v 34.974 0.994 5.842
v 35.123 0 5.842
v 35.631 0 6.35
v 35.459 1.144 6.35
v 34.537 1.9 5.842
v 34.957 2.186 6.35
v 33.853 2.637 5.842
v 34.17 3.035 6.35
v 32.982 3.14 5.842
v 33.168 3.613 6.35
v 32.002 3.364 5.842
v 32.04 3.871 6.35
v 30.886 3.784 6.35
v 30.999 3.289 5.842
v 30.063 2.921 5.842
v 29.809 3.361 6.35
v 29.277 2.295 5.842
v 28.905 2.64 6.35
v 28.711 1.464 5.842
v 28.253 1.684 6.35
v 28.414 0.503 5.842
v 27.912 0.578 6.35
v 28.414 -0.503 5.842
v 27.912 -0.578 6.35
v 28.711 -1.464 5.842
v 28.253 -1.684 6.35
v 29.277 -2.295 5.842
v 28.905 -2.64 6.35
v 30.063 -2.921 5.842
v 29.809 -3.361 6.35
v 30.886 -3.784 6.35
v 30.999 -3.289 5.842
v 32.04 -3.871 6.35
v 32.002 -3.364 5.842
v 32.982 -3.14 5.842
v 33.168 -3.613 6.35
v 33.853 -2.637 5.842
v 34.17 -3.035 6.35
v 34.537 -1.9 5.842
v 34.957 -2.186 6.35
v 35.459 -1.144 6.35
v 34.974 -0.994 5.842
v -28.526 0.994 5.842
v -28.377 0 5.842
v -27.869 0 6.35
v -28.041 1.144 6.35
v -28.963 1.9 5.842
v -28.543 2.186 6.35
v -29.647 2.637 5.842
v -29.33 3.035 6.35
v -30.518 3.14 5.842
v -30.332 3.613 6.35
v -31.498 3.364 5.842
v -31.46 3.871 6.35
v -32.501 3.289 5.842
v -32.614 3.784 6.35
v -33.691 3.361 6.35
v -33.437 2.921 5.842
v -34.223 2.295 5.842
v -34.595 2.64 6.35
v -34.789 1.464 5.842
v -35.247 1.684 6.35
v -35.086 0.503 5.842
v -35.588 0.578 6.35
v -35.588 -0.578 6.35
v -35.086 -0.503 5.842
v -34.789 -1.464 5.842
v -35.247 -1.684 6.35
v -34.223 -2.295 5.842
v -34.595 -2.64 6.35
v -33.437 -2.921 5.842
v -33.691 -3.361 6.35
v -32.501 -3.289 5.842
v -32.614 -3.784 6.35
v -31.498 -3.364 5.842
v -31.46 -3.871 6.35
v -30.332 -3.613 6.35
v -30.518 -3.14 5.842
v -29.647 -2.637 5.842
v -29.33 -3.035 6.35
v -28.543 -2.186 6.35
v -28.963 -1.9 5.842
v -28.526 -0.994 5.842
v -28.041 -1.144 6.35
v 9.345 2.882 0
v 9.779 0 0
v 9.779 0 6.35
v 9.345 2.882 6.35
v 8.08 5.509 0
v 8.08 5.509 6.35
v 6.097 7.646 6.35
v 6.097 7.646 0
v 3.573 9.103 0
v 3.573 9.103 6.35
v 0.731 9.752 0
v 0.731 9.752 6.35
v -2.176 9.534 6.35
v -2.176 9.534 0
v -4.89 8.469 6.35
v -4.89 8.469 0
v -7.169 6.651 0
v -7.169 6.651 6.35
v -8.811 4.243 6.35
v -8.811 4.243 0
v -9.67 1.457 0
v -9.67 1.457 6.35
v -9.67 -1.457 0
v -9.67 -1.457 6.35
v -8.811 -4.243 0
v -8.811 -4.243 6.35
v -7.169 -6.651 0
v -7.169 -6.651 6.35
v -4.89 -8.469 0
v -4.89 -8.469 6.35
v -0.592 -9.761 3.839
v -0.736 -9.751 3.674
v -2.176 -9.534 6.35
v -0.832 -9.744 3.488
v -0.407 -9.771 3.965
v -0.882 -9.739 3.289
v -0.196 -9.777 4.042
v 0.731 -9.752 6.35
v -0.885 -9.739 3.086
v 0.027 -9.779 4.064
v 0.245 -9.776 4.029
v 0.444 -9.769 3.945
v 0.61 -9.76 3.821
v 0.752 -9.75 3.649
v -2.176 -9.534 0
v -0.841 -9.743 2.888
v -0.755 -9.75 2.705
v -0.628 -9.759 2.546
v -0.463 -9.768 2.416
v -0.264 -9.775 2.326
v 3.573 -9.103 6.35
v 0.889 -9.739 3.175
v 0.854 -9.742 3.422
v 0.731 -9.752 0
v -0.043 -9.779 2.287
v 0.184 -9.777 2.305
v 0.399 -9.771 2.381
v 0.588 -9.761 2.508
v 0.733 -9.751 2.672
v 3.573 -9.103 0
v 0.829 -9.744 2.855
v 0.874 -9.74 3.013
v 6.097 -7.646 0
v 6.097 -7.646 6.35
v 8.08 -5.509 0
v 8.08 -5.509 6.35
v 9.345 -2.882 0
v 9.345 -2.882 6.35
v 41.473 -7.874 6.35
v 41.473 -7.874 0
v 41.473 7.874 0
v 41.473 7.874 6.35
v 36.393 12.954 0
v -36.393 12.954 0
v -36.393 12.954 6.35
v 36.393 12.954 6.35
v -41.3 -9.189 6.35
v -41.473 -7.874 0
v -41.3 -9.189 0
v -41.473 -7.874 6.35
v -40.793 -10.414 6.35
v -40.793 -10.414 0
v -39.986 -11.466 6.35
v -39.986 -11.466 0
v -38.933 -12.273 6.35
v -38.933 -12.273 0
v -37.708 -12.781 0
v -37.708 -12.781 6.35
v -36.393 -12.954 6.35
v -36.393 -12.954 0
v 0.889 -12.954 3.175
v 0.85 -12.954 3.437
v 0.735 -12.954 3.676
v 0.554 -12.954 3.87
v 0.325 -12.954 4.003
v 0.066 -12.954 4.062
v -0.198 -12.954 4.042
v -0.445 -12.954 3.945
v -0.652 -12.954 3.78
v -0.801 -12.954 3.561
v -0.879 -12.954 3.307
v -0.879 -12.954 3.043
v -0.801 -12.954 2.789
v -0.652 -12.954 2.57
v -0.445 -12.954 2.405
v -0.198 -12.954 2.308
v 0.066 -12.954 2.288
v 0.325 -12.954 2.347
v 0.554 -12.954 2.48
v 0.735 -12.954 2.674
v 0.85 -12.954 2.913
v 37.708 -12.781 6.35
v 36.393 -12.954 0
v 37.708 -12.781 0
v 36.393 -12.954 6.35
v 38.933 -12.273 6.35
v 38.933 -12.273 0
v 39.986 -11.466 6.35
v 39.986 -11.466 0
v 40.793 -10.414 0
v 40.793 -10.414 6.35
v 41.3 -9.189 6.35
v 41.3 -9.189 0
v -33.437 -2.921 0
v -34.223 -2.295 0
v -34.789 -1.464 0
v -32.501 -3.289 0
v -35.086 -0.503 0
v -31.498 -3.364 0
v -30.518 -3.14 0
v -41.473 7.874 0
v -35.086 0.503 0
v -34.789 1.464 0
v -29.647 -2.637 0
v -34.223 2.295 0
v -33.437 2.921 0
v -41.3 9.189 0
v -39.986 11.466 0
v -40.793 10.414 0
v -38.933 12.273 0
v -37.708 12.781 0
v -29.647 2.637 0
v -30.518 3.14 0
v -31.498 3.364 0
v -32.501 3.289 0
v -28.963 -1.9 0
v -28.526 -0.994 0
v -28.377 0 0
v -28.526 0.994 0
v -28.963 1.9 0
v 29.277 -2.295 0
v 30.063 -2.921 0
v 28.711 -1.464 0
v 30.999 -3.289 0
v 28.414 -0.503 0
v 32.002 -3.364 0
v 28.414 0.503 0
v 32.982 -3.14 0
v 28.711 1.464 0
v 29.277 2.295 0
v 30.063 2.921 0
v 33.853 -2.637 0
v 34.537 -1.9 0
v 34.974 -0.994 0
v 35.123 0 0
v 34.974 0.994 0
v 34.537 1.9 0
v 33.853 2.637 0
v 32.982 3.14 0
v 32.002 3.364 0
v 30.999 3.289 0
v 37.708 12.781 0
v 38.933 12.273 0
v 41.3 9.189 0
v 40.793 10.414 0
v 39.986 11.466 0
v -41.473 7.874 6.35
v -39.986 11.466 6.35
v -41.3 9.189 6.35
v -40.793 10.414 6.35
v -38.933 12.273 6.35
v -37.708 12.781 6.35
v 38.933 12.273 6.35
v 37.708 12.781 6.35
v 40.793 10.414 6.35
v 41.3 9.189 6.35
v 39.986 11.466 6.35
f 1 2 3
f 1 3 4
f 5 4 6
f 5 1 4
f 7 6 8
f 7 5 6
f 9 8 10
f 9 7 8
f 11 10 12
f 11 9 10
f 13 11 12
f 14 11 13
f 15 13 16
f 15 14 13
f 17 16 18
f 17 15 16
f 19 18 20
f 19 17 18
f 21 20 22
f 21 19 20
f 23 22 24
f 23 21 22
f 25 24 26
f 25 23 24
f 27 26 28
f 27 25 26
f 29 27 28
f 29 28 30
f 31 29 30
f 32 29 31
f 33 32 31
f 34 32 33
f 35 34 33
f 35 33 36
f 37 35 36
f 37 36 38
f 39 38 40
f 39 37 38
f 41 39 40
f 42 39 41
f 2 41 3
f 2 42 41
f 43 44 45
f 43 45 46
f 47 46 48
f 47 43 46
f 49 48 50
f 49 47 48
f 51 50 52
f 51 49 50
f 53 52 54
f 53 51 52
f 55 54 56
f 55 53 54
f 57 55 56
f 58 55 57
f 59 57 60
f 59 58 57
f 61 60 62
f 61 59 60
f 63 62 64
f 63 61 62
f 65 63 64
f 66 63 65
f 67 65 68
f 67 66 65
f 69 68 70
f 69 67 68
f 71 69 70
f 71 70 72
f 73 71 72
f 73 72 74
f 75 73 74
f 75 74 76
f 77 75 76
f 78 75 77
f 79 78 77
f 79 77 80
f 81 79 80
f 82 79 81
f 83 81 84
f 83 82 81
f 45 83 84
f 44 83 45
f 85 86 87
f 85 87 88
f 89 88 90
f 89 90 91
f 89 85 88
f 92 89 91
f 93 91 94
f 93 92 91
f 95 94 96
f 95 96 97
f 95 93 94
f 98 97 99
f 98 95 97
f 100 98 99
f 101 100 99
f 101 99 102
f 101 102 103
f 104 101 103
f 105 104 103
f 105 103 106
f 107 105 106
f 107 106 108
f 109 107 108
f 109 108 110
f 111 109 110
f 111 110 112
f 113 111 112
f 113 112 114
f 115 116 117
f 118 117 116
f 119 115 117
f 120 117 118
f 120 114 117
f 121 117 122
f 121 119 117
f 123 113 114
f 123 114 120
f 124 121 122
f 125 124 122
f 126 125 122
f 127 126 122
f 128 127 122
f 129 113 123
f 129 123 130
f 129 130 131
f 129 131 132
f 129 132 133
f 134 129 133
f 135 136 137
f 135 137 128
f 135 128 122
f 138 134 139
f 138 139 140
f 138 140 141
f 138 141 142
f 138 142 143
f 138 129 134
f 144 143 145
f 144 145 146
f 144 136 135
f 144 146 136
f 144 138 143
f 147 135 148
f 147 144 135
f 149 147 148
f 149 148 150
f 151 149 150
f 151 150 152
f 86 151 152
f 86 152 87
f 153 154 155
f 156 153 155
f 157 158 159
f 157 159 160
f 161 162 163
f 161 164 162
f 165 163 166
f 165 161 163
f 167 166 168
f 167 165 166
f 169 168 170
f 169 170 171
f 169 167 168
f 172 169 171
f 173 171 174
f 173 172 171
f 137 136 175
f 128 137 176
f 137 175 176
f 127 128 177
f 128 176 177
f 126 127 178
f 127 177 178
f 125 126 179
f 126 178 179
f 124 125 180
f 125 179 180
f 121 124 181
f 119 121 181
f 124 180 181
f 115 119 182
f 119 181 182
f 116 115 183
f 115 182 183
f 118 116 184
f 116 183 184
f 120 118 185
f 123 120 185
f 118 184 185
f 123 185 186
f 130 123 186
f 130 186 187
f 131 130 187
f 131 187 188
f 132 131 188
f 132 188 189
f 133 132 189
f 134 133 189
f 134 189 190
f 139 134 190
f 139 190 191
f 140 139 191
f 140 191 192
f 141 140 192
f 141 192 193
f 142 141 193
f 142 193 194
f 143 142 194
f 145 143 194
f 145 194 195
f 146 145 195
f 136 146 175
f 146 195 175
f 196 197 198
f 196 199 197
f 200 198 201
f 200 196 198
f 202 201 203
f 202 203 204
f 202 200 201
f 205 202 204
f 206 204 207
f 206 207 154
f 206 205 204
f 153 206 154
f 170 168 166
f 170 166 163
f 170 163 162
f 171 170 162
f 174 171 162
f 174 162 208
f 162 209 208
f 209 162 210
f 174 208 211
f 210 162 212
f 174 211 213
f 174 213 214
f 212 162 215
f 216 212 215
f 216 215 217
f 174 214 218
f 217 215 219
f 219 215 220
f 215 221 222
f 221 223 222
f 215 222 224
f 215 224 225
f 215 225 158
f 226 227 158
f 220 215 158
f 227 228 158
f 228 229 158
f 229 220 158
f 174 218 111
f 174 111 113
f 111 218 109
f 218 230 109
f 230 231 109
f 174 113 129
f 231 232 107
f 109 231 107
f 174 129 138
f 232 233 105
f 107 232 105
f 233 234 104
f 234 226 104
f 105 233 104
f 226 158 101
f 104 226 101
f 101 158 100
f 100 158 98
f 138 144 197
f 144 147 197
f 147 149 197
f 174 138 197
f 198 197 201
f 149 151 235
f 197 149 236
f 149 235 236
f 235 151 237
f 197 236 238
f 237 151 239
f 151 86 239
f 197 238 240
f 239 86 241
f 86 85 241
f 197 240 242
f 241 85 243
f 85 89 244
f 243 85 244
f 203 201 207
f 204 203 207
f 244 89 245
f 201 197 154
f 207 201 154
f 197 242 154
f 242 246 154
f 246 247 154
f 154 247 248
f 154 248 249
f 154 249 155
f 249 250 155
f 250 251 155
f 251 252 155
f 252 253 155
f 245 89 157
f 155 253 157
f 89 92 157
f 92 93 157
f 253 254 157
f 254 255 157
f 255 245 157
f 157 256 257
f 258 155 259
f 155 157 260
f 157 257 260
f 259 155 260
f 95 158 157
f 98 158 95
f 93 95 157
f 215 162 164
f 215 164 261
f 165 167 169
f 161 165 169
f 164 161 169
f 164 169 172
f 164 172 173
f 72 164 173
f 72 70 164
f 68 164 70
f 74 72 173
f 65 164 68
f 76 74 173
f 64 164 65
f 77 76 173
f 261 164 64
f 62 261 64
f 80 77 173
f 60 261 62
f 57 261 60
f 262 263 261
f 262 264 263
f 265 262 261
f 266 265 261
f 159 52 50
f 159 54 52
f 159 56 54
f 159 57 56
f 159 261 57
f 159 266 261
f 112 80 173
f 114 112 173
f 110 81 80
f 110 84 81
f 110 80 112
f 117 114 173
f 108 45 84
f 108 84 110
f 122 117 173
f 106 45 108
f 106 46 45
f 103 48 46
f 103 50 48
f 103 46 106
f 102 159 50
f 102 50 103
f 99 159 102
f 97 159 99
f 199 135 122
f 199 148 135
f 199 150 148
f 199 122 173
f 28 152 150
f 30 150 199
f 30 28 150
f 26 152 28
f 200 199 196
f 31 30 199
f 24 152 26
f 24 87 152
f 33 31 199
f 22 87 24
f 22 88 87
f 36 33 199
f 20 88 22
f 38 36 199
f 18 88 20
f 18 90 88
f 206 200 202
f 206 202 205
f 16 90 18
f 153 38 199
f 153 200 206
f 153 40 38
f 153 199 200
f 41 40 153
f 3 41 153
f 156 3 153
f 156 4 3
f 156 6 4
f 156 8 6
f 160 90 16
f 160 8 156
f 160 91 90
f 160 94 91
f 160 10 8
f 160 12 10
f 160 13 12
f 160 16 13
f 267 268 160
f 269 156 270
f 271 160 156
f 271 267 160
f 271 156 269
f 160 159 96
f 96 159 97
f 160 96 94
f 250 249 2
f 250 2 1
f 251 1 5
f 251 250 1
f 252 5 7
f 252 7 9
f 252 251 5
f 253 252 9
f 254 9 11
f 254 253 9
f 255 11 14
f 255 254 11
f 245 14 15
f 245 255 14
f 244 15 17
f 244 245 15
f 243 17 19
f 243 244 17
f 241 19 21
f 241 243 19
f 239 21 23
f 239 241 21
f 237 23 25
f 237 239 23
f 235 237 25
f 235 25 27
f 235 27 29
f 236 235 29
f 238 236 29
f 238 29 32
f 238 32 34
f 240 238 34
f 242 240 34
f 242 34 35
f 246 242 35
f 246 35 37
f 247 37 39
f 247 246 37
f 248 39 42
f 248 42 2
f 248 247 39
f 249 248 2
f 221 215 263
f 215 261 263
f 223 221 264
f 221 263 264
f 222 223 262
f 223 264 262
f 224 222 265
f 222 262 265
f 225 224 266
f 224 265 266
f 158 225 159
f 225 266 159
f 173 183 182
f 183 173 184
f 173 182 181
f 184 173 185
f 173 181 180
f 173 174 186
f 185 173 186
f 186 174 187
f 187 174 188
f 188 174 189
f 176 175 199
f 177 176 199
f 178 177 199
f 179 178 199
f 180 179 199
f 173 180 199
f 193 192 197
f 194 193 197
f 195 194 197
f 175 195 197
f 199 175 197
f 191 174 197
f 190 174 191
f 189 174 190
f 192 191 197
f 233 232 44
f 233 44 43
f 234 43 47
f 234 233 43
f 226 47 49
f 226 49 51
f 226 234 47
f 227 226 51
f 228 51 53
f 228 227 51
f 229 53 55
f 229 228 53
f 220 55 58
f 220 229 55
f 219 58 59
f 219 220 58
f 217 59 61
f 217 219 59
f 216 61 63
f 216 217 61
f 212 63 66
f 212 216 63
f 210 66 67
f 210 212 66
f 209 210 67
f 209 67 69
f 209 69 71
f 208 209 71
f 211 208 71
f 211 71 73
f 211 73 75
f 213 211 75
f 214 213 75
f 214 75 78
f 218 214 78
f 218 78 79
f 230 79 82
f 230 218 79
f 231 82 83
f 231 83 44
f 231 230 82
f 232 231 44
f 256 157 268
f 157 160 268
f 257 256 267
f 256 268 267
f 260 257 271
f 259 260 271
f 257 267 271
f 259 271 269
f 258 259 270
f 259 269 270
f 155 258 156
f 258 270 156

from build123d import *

# Parameters (mm, degrees)
F0_W     = 82.946875
F0_H     = 25.908
F0_R     = 3.3734375
F0_R_2   = 9.779
F1_DEPTH = 6.35
F2_R     = 0.889
F3_DEPTH = 3.2164930276
F4_R     = 5.08
F5_SIZE  = 0.508


with BuildPart() as f1:
    # F0 (on Top) → F1 (new body)
    with BuildSketch(Plane.XY):
        Rectangle(F0_W, F0_H)
        with Locations((-31.75, 0)):
            Circle(F0_R, mode=Mode.SUBTRACT)
        Circle(F0_R_2, mode=Mode.SUBTRACT)
        with Locations((31.75, 0)):
            Circle(F0_R, mode=Mode.SUBTRACT)
    extrude(amount=F1_DEPTH)

    # F2 (on face) → F3 (cut, through all)
    with BuildSketch(Plane.XZ.offset(12.954)):
        with Locations((0, 3.175)):
            Circle(F2_R)
    extrude(amount=-F3_DEPTH, mode=Mode.SUBTRACT)

    # F4
    f4_edges = [f1.edges().sort_by_distance(p)[0] for p in [
        (41.473438, -12.954, 3.175),
        (41.473438, 12.954, 3.175),
        (-41.473438, -12.954, 3.175),
        (-41.473438, 12.954, 3.175),
    ]]
    fillet(f4_edges, radius=F4_R)

    # F5
    f5_edges = [f1.edges().sort_by_distance(p)[0] for p in [
        (-35.123438, 0, 6.35),
        (28.376562, 0, 6.35),
    ]]
    chamfer(f5_edges, length=F5_SIZE)


solid = f1.part
